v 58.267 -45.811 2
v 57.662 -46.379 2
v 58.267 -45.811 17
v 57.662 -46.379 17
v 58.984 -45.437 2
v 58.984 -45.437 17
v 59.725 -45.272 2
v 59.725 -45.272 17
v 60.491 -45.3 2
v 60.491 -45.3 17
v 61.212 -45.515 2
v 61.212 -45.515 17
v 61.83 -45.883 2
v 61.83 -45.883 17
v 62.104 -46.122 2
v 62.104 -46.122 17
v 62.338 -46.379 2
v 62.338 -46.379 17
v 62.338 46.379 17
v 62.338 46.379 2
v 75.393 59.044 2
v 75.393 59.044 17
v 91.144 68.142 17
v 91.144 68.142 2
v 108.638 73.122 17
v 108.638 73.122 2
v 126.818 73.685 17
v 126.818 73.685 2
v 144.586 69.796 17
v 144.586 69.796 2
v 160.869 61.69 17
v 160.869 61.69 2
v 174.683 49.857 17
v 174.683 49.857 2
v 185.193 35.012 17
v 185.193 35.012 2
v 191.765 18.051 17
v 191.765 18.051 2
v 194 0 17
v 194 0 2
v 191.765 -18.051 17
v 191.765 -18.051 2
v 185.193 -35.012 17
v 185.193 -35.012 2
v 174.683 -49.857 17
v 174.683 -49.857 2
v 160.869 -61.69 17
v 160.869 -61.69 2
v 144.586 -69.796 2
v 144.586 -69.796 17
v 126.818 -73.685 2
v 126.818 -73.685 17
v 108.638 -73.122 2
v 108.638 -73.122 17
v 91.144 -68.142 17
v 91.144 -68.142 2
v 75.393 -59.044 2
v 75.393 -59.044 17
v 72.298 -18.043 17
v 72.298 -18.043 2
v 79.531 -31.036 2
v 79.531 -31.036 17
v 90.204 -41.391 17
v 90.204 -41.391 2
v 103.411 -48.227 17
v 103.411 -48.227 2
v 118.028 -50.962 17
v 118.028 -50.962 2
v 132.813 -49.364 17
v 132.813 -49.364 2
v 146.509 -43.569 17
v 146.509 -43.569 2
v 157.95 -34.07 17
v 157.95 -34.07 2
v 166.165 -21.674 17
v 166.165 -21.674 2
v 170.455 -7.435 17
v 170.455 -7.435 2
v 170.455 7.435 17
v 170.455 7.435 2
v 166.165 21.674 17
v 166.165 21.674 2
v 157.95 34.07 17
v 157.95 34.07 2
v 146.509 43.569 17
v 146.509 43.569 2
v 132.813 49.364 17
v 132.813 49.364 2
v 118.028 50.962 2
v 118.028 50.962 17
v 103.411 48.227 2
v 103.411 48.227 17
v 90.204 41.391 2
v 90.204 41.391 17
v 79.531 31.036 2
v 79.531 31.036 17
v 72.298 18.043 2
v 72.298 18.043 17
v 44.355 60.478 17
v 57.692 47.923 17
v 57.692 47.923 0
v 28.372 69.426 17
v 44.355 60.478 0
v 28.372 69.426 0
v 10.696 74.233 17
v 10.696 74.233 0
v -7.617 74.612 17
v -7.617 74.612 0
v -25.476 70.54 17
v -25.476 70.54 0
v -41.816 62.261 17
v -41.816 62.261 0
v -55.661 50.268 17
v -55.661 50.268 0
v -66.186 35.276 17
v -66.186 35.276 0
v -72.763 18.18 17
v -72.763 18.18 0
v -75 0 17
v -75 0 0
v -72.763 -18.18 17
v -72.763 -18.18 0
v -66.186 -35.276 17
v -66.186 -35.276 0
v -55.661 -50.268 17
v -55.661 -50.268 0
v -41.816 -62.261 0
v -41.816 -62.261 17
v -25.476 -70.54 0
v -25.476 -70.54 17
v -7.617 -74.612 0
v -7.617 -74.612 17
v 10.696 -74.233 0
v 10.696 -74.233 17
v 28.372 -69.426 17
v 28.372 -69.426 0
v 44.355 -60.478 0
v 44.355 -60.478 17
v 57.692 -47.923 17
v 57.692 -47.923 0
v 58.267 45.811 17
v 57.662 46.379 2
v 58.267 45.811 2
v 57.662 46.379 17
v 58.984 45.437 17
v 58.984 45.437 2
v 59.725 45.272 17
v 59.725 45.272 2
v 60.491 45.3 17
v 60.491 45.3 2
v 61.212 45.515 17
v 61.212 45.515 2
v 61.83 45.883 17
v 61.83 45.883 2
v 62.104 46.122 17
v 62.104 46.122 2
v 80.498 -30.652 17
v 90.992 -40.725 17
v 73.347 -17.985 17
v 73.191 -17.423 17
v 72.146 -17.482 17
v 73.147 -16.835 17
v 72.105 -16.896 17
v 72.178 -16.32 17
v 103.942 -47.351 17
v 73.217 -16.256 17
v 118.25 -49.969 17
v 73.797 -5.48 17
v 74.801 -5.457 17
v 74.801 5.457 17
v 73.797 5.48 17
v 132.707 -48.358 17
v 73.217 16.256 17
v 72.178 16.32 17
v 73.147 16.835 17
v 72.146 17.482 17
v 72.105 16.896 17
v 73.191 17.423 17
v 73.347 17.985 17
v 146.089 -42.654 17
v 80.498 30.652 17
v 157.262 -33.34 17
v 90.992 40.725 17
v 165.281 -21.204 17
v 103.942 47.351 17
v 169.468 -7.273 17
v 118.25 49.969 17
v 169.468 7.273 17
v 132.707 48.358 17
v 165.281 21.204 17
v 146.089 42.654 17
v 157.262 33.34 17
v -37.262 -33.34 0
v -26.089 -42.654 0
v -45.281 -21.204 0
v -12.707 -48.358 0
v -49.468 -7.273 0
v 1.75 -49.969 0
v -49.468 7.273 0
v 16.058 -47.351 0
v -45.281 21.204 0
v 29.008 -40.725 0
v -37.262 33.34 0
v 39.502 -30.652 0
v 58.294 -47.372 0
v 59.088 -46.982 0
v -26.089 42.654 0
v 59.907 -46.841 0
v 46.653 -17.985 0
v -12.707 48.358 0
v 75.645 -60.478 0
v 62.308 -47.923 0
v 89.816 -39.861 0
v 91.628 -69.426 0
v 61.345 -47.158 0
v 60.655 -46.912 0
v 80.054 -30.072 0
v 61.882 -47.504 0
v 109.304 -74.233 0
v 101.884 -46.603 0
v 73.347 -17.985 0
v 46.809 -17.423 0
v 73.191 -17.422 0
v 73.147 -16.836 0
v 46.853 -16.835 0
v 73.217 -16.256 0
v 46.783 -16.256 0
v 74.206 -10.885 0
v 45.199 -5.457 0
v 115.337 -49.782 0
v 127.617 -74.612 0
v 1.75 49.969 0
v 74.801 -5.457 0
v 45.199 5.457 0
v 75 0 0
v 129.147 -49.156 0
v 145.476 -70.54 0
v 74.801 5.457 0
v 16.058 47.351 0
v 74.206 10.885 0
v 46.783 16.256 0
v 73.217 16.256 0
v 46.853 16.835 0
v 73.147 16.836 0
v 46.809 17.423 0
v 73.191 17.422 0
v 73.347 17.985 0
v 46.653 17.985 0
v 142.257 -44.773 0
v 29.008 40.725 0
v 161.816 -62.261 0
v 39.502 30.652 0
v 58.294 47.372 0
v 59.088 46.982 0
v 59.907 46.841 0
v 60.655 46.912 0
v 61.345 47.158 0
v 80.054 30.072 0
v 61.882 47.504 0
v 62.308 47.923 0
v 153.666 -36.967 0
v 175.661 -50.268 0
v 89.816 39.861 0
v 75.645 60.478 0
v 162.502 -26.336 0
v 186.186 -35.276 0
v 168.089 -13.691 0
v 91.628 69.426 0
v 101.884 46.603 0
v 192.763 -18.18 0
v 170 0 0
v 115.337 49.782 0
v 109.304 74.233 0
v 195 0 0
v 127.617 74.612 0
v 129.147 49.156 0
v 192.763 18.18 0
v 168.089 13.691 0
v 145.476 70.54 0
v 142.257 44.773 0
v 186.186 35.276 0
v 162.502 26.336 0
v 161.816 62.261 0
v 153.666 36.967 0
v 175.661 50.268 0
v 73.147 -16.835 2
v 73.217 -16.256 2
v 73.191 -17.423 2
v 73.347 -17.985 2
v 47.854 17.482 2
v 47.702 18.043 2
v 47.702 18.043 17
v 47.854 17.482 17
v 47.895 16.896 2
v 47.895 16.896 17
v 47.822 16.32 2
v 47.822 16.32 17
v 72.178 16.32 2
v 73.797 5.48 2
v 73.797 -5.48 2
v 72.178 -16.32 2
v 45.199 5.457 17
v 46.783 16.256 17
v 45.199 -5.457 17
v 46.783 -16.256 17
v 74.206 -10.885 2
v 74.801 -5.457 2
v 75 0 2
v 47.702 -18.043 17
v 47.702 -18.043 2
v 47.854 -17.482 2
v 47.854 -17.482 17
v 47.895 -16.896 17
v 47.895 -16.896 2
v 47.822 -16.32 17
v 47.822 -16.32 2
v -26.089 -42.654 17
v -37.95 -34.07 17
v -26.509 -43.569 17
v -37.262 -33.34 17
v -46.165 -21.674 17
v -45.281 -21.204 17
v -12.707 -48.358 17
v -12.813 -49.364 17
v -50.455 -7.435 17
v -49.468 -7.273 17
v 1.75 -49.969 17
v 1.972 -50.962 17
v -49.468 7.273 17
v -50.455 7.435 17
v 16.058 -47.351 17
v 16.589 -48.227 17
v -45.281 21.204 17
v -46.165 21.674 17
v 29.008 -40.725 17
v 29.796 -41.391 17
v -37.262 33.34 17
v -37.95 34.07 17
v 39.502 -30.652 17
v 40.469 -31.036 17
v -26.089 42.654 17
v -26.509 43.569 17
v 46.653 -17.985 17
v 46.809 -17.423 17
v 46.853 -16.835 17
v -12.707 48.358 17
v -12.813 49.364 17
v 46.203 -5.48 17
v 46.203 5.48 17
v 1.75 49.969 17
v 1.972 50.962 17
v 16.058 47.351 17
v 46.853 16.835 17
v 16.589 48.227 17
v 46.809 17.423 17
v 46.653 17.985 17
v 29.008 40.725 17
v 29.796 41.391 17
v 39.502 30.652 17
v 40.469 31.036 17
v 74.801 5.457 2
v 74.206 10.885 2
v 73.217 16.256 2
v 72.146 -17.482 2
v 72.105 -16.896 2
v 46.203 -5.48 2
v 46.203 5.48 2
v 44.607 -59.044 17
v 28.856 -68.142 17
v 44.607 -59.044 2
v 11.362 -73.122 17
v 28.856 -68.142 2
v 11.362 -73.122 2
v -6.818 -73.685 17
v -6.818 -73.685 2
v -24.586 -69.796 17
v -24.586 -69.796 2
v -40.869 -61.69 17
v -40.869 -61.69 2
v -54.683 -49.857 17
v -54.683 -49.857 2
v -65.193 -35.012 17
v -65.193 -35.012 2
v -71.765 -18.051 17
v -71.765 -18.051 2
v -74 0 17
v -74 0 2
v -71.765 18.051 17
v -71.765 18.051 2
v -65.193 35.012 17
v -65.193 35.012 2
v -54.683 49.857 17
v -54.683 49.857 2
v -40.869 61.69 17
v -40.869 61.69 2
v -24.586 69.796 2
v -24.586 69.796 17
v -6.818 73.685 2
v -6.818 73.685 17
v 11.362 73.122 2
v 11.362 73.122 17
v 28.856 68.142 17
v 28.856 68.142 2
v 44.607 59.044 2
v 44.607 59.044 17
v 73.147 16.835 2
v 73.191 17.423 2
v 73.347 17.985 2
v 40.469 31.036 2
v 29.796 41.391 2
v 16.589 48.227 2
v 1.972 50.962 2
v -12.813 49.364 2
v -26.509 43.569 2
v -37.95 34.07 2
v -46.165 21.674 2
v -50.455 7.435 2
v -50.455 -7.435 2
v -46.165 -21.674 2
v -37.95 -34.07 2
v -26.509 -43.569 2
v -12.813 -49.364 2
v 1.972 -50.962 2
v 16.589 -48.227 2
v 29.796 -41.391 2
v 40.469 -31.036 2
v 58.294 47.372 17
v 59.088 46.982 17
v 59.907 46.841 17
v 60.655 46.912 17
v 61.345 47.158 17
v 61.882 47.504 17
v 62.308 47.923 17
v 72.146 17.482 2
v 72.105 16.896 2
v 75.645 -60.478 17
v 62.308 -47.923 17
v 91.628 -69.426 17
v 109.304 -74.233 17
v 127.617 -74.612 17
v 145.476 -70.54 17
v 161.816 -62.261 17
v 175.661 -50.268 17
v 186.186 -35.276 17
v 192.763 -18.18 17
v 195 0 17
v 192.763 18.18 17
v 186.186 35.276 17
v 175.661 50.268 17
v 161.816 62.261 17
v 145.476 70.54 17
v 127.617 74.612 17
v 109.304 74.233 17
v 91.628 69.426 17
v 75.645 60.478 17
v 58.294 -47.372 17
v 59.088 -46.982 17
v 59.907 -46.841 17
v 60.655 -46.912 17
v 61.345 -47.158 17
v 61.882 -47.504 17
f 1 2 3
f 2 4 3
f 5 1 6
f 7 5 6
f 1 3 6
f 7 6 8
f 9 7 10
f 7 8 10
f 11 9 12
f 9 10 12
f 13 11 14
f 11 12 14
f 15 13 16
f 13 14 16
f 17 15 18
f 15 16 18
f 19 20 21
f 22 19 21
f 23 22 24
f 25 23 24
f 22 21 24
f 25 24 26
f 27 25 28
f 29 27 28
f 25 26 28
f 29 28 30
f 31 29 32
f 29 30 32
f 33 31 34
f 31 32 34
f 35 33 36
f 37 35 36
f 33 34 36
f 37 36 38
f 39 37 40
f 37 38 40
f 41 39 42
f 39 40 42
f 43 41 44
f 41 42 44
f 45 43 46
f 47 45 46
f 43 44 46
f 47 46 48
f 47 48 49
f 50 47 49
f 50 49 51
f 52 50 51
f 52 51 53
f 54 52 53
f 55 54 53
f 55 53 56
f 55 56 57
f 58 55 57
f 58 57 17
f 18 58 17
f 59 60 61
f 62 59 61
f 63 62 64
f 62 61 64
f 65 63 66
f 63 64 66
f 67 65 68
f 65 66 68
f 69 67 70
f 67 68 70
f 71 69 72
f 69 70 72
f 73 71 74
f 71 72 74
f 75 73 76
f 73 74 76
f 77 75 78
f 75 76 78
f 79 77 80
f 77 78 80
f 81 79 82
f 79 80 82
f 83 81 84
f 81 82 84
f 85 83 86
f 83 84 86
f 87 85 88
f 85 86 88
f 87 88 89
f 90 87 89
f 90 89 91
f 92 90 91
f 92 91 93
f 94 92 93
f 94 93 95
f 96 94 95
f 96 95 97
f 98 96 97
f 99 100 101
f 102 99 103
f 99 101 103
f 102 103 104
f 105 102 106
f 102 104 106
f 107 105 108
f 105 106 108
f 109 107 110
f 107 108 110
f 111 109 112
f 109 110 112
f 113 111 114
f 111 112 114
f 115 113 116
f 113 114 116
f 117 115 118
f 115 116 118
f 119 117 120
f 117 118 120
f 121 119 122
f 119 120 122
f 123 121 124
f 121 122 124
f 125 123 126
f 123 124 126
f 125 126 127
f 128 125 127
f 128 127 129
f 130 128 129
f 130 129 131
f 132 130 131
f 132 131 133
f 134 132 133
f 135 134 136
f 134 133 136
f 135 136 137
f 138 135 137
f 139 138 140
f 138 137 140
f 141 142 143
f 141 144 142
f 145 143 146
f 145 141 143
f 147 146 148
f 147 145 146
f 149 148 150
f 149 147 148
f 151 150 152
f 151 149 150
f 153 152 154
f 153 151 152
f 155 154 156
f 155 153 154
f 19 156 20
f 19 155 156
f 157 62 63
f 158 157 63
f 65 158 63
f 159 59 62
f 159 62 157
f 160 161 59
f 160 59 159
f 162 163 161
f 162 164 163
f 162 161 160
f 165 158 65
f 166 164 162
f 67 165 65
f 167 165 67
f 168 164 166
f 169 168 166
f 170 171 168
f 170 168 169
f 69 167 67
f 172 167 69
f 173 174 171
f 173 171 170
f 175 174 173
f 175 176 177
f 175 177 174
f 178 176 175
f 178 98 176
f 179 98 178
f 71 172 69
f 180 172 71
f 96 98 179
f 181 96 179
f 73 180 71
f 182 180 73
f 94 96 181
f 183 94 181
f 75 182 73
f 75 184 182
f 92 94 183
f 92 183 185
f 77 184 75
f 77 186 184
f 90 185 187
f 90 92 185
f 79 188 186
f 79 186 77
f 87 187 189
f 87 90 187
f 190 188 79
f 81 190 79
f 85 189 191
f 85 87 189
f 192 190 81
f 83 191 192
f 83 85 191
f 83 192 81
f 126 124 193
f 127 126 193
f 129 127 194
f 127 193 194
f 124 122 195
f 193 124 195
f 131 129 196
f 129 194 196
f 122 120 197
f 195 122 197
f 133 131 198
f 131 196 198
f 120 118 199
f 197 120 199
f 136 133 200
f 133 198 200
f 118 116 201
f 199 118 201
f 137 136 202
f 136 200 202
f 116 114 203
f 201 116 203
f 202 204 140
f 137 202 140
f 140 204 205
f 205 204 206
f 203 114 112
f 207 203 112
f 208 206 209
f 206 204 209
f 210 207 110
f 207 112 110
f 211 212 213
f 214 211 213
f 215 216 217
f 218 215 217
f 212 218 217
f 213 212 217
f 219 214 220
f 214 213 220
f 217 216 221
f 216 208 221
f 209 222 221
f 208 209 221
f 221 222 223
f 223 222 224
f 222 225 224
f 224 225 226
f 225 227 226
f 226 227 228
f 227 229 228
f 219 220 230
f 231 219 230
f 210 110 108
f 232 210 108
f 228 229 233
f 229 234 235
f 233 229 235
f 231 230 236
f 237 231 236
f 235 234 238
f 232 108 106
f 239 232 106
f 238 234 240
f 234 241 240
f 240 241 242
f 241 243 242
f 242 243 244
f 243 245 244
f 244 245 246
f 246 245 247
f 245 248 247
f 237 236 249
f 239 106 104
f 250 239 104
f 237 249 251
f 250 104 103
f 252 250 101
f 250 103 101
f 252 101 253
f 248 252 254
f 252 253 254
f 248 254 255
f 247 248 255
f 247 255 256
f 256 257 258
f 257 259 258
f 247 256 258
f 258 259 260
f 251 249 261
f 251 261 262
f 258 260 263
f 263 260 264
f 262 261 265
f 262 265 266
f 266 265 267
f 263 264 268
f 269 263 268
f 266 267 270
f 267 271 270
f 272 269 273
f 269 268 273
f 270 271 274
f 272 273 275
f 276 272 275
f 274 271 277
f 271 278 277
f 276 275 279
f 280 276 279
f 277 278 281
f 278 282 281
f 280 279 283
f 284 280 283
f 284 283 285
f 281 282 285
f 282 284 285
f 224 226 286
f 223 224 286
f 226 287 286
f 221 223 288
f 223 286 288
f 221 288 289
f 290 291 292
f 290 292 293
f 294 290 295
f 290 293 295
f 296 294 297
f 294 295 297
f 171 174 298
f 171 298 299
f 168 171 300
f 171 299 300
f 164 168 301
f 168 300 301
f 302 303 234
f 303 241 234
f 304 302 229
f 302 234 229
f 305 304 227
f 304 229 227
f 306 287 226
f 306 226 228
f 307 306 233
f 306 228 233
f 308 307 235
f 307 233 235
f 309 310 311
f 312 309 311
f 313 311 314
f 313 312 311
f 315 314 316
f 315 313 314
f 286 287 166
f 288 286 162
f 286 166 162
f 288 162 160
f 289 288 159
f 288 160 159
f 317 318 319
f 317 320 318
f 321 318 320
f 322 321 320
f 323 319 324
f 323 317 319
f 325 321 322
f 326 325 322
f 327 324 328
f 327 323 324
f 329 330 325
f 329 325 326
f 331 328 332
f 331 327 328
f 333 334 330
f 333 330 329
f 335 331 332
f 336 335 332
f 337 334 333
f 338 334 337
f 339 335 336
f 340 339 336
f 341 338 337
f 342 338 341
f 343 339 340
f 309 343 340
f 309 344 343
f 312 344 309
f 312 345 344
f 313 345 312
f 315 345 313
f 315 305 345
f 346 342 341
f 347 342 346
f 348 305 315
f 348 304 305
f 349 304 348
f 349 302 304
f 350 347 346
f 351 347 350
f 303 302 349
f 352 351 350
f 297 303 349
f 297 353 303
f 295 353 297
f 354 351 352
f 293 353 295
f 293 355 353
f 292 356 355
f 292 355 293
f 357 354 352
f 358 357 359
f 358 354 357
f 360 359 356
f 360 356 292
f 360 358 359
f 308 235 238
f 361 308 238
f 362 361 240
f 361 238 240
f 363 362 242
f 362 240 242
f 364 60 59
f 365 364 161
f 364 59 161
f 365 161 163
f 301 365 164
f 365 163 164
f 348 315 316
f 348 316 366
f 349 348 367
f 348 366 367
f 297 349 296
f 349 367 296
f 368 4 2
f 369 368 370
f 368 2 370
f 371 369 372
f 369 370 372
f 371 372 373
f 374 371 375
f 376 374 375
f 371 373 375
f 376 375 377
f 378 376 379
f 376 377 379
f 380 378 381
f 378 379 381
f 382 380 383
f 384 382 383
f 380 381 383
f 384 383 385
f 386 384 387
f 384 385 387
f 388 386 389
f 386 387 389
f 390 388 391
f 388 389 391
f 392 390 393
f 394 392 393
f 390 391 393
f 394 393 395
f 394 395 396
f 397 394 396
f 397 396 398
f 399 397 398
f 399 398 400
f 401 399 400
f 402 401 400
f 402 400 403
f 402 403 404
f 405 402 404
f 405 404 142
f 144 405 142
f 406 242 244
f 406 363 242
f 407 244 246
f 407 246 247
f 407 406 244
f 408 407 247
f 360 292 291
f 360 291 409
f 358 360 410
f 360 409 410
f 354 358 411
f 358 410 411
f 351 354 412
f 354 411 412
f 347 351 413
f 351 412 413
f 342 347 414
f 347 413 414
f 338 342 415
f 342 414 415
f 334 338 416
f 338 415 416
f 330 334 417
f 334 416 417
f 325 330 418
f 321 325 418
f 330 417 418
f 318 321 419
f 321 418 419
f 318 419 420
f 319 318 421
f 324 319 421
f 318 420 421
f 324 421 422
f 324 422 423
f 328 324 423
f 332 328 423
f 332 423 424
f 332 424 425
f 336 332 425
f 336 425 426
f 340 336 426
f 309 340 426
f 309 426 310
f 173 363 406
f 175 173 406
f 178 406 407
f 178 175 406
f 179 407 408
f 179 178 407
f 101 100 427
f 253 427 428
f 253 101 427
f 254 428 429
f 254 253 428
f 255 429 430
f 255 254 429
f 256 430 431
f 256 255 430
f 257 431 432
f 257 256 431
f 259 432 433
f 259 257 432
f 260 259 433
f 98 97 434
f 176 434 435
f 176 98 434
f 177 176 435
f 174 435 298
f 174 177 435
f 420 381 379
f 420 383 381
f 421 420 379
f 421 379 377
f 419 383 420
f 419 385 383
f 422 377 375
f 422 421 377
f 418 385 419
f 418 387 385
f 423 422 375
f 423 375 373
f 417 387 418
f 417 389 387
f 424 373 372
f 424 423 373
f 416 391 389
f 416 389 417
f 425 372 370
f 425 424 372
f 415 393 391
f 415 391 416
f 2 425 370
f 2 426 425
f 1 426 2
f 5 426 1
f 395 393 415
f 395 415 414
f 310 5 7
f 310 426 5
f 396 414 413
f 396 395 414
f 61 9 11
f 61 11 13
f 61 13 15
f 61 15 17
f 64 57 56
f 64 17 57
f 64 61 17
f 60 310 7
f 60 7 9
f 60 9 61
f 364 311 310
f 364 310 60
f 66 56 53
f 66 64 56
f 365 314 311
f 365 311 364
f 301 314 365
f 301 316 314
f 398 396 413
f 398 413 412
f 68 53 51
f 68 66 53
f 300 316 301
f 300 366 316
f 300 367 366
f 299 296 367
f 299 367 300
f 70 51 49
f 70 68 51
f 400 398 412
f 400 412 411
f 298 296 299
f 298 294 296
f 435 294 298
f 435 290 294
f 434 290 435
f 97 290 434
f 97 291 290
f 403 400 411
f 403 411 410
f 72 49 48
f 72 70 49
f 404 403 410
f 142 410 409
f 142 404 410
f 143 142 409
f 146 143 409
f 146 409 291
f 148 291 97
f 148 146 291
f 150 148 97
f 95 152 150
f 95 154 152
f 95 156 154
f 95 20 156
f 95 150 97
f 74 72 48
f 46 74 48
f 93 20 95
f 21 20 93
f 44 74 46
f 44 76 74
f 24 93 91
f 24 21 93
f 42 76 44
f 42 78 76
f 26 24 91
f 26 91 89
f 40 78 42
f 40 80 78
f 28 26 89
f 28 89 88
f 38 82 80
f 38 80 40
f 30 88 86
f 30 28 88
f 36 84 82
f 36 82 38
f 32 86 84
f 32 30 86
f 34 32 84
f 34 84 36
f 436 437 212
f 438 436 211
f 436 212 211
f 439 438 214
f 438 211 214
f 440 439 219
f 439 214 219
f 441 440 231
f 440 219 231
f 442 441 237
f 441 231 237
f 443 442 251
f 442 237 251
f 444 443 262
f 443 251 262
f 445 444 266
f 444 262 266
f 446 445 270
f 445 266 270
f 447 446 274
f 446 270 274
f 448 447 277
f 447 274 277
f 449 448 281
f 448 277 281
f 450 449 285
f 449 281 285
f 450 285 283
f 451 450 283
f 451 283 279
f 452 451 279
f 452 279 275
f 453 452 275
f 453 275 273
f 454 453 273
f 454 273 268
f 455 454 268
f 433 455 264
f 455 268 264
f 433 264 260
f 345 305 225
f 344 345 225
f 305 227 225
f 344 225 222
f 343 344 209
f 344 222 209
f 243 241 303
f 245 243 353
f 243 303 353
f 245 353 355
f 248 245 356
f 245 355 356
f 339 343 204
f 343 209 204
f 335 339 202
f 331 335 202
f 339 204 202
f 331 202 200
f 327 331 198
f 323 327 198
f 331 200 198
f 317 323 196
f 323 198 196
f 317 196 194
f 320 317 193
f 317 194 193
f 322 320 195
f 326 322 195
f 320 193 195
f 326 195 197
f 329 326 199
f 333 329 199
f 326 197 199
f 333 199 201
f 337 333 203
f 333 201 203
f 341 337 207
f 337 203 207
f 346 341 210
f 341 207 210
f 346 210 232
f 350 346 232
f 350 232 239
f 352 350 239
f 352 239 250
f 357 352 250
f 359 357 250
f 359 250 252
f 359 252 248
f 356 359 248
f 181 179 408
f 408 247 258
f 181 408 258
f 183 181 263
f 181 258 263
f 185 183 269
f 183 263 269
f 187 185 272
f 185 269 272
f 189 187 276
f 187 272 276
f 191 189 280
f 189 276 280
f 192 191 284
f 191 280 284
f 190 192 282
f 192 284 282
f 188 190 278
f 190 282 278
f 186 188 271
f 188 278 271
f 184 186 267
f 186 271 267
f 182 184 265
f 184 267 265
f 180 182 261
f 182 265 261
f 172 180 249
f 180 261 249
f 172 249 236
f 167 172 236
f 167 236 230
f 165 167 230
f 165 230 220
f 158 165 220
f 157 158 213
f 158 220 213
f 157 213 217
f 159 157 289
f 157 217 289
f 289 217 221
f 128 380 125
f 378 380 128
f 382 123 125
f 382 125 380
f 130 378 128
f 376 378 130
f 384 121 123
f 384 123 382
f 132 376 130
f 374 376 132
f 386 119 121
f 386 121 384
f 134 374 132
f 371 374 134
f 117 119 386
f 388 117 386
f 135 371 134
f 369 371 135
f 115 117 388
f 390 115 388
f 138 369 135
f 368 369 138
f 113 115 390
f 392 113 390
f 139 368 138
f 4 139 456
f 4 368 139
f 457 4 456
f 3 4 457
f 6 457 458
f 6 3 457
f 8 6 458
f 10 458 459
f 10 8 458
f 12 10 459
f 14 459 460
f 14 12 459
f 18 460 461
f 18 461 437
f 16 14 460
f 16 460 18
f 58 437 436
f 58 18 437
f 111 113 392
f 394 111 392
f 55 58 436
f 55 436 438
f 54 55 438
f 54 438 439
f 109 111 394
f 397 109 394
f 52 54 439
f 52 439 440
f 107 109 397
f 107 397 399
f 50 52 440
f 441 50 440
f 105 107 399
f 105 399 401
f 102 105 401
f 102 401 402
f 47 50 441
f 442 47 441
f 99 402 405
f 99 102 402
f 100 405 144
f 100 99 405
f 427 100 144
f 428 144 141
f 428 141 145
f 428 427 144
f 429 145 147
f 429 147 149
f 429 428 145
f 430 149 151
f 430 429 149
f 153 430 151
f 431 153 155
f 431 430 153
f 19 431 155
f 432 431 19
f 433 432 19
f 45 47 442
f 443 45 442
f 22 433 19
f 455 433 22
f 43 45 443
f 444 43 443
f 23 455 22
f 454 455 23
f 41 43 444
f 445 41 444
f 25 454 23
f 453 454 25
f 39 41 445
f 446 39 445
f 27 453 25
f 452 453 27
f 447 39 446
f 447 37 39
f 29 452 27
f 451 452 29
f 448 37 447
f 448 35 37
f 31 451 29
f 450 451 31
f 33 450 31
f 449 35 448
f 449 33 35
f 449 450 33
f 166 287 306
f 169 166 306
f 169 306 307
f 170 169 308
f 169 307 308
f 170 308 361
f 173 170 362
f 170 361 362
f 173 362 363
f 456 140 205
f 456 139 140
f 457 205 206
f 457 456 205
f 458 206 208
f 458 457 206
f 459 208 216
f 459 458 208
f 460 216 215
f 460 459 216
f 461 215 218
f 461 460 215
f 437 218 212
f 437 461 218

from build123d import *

# Parameters (mm, degrees)
F1_DEPTH = 2
F3_DEPTH = 15
F4_R     = 3


with BuildPart() as f1:
    # F0 (on Top) → F1 (new body)
    with BuildSketch(Plane.XY):
        with BuildLine():
            ThreePointArc((46.9791666667, 17.11601295), (49.2390004637, 8.6902723394), (50, 0))
            ThreePointArc((50, 0), (49.2390004637, -8.6902723394), (46.9791666667, -17.11601295))
            ThreePointArc((46.9791666667, -17.11601295), (52.0440237461, -31.7330315504), (60, -45))
            ThreePointArc((60, -45), (67.9559762539, -31.7330315504), (73.0208333333, -17.11601295))
            ThreePointArc((73.0208333333, -17.11601295), (70, 0), (73.0208333333, 17.11601295))
            ThreePointArc((73.0208333333, 17.11601295), (67.9559762539, 31.7330315504), (60, 45))
            ThreePointArc((60, 45), (52.0440237461, 31.7330315504), (46.9791666667, 17.11601295))
        make_face()
        with BuildLine():
            ThreePointArc((46.9791666667, -17.11601295), (-50, 0), (46.9791666667, 17.11601295))
            ThreePointArc((46.9791666667, 17.11601295), (52.0440237461, 31.7330315504), (60, 45))
            ThreePointArc((60, 45), (-75, 0), (60, -45))
            ThreePointArc((60, -45), (52.0440237461, -31.7330315504), (46.9791666667, -17.11601295))
        make_face()
        with BuildLine():
            ThreePointArc((195, 0), (143.7170824513, 71.1512473538), (60, 45))
            ThreePointArc((60, 45), (67.9559762539, 31.7330315504), (73.0208333333, 17.11601295))
            ThreePointArc((73.0208333333, 17.11601295), (128.6902723394, 49.2390004637), (170, 0))
            ThreePointArc((170, 0), (128.6902723394, -49.2390004637), (73.0208333333, -17.11601295))
            ThreePointArc((73.0208333333, -17.11601295), (67.9559762539, -31.7330315504), (60, -45))
            ThreePointArc((60, -45), (143.7170824513, -71.1512473538), (195, 0))
        make_face()
        with BuildLine():
            ThreePointArc((46.9791666667, -17.11601295), (49.2390004637, -8.6902723394), (50, 0))
            ThreePointArc((50, 0), (49.2390004637, 8.6902723394), (46.9791666667, 17.11601295))
            ThreePointArc((46.9791666667, 17.11601295), (45, 0), (46.9791666667, -17.11601295))
        make_face()
        with BuildLine():
            ThreePointArc((75, 0), (74.5035653509, 8.6150304701), (73.0208333333, 17.11601295))
            ThreePointArc((73.0208333333, 17.11601295), (70, 0), (73.0208333333, -17.11601295))
            ThreePointArc((73.0208333333, -17.11601295), (74.5035653509, -8.6150304701), (75, 0))
        make_face()
    extrude(amount=F1_DEPTH)

    # F2 (on face) → F3 (join)
    with BuildSketch(Plane.XY.offset(2)):
        with BuildLine():
            ThreePointArc((60, 45), (-75, 0), (60, -45))
            ThreePointArc((60, -45), (195, 0), (60, 45))
        make_face()
        with BuildLine():
            ThreePointArc((60, -43.3128156554), (-74, 0), (60, 43.3128156554))
            ThreePointArc((60, 43.3128156554), (194, 0), (60, -43.3128156554))
        make_face(mode=Mode.SUBTRACT)
        with BuildLine():
            ThreePointArc((48.0208333333, -17.1755514023), (46, 0), (48.0208333333, 17.1755514023))
            ThreePointArc((48.0208333333, 17.1755514023), (-51, 0), (48.0208333333, -17.1755514023))
        make_face()
        with BuildLine():
            ThreePointArc((46.9791666667, -17.11601295), (-50, 0), (46.9791666667, 17.11601295))
            ThreePointArc((46.9791666667, 17.11601295), (45, 0), (46.9791666667, -17.11601295))
        make_face(mode=Mode.SUBTRACT)
        with BuildLine():
            ThreePointArc((71.9791666667, 17.1755514023), (74, 0), (71.9791666667, -17.1755514023))
            ThreePointArc((71.9791666667, -17.1755514023), (171, 0), (71.9791666667, 17.1755514023))
        make_face()
        with BuildLine():
            ThreePointArc((73.0208333333, 17.11601295), (170, 0), (73.0208333333, -17.11601295))
            ThreePointArc((73.0208333333, -17.11601295), (75, 0), (73.0208333333, 17.11601295))
        make_face(mode=Mode.SUBTRACT)
    extrude(amount=F3_DEPTH)

    # F4
    f4_edges = [f1.edges().sort_by_distance(p)[0] for p in [
        (60, 45, 8.5),
        (60, -45, 8.5),
        (60, 43.312816, 9.5),
        (71.979167, -17.175551, 9.5),
        (73.020833, -17.116013, 8.5),
        (73.020833, 17.116013, 8.5),
        (48.020833, 17.175551, 9.5),
        (46.979167, 17.116013, 8.5),
        (46.979167, -17.116013, 8.5),
        (60, -43.312816, 9.5),
        (48.020833, -17.175551, 9.5),
        (71.979167, 17.175551, 9.5),
    ]]
    fillet(f4_edges, radius=F4_R)


solid = f1.part
